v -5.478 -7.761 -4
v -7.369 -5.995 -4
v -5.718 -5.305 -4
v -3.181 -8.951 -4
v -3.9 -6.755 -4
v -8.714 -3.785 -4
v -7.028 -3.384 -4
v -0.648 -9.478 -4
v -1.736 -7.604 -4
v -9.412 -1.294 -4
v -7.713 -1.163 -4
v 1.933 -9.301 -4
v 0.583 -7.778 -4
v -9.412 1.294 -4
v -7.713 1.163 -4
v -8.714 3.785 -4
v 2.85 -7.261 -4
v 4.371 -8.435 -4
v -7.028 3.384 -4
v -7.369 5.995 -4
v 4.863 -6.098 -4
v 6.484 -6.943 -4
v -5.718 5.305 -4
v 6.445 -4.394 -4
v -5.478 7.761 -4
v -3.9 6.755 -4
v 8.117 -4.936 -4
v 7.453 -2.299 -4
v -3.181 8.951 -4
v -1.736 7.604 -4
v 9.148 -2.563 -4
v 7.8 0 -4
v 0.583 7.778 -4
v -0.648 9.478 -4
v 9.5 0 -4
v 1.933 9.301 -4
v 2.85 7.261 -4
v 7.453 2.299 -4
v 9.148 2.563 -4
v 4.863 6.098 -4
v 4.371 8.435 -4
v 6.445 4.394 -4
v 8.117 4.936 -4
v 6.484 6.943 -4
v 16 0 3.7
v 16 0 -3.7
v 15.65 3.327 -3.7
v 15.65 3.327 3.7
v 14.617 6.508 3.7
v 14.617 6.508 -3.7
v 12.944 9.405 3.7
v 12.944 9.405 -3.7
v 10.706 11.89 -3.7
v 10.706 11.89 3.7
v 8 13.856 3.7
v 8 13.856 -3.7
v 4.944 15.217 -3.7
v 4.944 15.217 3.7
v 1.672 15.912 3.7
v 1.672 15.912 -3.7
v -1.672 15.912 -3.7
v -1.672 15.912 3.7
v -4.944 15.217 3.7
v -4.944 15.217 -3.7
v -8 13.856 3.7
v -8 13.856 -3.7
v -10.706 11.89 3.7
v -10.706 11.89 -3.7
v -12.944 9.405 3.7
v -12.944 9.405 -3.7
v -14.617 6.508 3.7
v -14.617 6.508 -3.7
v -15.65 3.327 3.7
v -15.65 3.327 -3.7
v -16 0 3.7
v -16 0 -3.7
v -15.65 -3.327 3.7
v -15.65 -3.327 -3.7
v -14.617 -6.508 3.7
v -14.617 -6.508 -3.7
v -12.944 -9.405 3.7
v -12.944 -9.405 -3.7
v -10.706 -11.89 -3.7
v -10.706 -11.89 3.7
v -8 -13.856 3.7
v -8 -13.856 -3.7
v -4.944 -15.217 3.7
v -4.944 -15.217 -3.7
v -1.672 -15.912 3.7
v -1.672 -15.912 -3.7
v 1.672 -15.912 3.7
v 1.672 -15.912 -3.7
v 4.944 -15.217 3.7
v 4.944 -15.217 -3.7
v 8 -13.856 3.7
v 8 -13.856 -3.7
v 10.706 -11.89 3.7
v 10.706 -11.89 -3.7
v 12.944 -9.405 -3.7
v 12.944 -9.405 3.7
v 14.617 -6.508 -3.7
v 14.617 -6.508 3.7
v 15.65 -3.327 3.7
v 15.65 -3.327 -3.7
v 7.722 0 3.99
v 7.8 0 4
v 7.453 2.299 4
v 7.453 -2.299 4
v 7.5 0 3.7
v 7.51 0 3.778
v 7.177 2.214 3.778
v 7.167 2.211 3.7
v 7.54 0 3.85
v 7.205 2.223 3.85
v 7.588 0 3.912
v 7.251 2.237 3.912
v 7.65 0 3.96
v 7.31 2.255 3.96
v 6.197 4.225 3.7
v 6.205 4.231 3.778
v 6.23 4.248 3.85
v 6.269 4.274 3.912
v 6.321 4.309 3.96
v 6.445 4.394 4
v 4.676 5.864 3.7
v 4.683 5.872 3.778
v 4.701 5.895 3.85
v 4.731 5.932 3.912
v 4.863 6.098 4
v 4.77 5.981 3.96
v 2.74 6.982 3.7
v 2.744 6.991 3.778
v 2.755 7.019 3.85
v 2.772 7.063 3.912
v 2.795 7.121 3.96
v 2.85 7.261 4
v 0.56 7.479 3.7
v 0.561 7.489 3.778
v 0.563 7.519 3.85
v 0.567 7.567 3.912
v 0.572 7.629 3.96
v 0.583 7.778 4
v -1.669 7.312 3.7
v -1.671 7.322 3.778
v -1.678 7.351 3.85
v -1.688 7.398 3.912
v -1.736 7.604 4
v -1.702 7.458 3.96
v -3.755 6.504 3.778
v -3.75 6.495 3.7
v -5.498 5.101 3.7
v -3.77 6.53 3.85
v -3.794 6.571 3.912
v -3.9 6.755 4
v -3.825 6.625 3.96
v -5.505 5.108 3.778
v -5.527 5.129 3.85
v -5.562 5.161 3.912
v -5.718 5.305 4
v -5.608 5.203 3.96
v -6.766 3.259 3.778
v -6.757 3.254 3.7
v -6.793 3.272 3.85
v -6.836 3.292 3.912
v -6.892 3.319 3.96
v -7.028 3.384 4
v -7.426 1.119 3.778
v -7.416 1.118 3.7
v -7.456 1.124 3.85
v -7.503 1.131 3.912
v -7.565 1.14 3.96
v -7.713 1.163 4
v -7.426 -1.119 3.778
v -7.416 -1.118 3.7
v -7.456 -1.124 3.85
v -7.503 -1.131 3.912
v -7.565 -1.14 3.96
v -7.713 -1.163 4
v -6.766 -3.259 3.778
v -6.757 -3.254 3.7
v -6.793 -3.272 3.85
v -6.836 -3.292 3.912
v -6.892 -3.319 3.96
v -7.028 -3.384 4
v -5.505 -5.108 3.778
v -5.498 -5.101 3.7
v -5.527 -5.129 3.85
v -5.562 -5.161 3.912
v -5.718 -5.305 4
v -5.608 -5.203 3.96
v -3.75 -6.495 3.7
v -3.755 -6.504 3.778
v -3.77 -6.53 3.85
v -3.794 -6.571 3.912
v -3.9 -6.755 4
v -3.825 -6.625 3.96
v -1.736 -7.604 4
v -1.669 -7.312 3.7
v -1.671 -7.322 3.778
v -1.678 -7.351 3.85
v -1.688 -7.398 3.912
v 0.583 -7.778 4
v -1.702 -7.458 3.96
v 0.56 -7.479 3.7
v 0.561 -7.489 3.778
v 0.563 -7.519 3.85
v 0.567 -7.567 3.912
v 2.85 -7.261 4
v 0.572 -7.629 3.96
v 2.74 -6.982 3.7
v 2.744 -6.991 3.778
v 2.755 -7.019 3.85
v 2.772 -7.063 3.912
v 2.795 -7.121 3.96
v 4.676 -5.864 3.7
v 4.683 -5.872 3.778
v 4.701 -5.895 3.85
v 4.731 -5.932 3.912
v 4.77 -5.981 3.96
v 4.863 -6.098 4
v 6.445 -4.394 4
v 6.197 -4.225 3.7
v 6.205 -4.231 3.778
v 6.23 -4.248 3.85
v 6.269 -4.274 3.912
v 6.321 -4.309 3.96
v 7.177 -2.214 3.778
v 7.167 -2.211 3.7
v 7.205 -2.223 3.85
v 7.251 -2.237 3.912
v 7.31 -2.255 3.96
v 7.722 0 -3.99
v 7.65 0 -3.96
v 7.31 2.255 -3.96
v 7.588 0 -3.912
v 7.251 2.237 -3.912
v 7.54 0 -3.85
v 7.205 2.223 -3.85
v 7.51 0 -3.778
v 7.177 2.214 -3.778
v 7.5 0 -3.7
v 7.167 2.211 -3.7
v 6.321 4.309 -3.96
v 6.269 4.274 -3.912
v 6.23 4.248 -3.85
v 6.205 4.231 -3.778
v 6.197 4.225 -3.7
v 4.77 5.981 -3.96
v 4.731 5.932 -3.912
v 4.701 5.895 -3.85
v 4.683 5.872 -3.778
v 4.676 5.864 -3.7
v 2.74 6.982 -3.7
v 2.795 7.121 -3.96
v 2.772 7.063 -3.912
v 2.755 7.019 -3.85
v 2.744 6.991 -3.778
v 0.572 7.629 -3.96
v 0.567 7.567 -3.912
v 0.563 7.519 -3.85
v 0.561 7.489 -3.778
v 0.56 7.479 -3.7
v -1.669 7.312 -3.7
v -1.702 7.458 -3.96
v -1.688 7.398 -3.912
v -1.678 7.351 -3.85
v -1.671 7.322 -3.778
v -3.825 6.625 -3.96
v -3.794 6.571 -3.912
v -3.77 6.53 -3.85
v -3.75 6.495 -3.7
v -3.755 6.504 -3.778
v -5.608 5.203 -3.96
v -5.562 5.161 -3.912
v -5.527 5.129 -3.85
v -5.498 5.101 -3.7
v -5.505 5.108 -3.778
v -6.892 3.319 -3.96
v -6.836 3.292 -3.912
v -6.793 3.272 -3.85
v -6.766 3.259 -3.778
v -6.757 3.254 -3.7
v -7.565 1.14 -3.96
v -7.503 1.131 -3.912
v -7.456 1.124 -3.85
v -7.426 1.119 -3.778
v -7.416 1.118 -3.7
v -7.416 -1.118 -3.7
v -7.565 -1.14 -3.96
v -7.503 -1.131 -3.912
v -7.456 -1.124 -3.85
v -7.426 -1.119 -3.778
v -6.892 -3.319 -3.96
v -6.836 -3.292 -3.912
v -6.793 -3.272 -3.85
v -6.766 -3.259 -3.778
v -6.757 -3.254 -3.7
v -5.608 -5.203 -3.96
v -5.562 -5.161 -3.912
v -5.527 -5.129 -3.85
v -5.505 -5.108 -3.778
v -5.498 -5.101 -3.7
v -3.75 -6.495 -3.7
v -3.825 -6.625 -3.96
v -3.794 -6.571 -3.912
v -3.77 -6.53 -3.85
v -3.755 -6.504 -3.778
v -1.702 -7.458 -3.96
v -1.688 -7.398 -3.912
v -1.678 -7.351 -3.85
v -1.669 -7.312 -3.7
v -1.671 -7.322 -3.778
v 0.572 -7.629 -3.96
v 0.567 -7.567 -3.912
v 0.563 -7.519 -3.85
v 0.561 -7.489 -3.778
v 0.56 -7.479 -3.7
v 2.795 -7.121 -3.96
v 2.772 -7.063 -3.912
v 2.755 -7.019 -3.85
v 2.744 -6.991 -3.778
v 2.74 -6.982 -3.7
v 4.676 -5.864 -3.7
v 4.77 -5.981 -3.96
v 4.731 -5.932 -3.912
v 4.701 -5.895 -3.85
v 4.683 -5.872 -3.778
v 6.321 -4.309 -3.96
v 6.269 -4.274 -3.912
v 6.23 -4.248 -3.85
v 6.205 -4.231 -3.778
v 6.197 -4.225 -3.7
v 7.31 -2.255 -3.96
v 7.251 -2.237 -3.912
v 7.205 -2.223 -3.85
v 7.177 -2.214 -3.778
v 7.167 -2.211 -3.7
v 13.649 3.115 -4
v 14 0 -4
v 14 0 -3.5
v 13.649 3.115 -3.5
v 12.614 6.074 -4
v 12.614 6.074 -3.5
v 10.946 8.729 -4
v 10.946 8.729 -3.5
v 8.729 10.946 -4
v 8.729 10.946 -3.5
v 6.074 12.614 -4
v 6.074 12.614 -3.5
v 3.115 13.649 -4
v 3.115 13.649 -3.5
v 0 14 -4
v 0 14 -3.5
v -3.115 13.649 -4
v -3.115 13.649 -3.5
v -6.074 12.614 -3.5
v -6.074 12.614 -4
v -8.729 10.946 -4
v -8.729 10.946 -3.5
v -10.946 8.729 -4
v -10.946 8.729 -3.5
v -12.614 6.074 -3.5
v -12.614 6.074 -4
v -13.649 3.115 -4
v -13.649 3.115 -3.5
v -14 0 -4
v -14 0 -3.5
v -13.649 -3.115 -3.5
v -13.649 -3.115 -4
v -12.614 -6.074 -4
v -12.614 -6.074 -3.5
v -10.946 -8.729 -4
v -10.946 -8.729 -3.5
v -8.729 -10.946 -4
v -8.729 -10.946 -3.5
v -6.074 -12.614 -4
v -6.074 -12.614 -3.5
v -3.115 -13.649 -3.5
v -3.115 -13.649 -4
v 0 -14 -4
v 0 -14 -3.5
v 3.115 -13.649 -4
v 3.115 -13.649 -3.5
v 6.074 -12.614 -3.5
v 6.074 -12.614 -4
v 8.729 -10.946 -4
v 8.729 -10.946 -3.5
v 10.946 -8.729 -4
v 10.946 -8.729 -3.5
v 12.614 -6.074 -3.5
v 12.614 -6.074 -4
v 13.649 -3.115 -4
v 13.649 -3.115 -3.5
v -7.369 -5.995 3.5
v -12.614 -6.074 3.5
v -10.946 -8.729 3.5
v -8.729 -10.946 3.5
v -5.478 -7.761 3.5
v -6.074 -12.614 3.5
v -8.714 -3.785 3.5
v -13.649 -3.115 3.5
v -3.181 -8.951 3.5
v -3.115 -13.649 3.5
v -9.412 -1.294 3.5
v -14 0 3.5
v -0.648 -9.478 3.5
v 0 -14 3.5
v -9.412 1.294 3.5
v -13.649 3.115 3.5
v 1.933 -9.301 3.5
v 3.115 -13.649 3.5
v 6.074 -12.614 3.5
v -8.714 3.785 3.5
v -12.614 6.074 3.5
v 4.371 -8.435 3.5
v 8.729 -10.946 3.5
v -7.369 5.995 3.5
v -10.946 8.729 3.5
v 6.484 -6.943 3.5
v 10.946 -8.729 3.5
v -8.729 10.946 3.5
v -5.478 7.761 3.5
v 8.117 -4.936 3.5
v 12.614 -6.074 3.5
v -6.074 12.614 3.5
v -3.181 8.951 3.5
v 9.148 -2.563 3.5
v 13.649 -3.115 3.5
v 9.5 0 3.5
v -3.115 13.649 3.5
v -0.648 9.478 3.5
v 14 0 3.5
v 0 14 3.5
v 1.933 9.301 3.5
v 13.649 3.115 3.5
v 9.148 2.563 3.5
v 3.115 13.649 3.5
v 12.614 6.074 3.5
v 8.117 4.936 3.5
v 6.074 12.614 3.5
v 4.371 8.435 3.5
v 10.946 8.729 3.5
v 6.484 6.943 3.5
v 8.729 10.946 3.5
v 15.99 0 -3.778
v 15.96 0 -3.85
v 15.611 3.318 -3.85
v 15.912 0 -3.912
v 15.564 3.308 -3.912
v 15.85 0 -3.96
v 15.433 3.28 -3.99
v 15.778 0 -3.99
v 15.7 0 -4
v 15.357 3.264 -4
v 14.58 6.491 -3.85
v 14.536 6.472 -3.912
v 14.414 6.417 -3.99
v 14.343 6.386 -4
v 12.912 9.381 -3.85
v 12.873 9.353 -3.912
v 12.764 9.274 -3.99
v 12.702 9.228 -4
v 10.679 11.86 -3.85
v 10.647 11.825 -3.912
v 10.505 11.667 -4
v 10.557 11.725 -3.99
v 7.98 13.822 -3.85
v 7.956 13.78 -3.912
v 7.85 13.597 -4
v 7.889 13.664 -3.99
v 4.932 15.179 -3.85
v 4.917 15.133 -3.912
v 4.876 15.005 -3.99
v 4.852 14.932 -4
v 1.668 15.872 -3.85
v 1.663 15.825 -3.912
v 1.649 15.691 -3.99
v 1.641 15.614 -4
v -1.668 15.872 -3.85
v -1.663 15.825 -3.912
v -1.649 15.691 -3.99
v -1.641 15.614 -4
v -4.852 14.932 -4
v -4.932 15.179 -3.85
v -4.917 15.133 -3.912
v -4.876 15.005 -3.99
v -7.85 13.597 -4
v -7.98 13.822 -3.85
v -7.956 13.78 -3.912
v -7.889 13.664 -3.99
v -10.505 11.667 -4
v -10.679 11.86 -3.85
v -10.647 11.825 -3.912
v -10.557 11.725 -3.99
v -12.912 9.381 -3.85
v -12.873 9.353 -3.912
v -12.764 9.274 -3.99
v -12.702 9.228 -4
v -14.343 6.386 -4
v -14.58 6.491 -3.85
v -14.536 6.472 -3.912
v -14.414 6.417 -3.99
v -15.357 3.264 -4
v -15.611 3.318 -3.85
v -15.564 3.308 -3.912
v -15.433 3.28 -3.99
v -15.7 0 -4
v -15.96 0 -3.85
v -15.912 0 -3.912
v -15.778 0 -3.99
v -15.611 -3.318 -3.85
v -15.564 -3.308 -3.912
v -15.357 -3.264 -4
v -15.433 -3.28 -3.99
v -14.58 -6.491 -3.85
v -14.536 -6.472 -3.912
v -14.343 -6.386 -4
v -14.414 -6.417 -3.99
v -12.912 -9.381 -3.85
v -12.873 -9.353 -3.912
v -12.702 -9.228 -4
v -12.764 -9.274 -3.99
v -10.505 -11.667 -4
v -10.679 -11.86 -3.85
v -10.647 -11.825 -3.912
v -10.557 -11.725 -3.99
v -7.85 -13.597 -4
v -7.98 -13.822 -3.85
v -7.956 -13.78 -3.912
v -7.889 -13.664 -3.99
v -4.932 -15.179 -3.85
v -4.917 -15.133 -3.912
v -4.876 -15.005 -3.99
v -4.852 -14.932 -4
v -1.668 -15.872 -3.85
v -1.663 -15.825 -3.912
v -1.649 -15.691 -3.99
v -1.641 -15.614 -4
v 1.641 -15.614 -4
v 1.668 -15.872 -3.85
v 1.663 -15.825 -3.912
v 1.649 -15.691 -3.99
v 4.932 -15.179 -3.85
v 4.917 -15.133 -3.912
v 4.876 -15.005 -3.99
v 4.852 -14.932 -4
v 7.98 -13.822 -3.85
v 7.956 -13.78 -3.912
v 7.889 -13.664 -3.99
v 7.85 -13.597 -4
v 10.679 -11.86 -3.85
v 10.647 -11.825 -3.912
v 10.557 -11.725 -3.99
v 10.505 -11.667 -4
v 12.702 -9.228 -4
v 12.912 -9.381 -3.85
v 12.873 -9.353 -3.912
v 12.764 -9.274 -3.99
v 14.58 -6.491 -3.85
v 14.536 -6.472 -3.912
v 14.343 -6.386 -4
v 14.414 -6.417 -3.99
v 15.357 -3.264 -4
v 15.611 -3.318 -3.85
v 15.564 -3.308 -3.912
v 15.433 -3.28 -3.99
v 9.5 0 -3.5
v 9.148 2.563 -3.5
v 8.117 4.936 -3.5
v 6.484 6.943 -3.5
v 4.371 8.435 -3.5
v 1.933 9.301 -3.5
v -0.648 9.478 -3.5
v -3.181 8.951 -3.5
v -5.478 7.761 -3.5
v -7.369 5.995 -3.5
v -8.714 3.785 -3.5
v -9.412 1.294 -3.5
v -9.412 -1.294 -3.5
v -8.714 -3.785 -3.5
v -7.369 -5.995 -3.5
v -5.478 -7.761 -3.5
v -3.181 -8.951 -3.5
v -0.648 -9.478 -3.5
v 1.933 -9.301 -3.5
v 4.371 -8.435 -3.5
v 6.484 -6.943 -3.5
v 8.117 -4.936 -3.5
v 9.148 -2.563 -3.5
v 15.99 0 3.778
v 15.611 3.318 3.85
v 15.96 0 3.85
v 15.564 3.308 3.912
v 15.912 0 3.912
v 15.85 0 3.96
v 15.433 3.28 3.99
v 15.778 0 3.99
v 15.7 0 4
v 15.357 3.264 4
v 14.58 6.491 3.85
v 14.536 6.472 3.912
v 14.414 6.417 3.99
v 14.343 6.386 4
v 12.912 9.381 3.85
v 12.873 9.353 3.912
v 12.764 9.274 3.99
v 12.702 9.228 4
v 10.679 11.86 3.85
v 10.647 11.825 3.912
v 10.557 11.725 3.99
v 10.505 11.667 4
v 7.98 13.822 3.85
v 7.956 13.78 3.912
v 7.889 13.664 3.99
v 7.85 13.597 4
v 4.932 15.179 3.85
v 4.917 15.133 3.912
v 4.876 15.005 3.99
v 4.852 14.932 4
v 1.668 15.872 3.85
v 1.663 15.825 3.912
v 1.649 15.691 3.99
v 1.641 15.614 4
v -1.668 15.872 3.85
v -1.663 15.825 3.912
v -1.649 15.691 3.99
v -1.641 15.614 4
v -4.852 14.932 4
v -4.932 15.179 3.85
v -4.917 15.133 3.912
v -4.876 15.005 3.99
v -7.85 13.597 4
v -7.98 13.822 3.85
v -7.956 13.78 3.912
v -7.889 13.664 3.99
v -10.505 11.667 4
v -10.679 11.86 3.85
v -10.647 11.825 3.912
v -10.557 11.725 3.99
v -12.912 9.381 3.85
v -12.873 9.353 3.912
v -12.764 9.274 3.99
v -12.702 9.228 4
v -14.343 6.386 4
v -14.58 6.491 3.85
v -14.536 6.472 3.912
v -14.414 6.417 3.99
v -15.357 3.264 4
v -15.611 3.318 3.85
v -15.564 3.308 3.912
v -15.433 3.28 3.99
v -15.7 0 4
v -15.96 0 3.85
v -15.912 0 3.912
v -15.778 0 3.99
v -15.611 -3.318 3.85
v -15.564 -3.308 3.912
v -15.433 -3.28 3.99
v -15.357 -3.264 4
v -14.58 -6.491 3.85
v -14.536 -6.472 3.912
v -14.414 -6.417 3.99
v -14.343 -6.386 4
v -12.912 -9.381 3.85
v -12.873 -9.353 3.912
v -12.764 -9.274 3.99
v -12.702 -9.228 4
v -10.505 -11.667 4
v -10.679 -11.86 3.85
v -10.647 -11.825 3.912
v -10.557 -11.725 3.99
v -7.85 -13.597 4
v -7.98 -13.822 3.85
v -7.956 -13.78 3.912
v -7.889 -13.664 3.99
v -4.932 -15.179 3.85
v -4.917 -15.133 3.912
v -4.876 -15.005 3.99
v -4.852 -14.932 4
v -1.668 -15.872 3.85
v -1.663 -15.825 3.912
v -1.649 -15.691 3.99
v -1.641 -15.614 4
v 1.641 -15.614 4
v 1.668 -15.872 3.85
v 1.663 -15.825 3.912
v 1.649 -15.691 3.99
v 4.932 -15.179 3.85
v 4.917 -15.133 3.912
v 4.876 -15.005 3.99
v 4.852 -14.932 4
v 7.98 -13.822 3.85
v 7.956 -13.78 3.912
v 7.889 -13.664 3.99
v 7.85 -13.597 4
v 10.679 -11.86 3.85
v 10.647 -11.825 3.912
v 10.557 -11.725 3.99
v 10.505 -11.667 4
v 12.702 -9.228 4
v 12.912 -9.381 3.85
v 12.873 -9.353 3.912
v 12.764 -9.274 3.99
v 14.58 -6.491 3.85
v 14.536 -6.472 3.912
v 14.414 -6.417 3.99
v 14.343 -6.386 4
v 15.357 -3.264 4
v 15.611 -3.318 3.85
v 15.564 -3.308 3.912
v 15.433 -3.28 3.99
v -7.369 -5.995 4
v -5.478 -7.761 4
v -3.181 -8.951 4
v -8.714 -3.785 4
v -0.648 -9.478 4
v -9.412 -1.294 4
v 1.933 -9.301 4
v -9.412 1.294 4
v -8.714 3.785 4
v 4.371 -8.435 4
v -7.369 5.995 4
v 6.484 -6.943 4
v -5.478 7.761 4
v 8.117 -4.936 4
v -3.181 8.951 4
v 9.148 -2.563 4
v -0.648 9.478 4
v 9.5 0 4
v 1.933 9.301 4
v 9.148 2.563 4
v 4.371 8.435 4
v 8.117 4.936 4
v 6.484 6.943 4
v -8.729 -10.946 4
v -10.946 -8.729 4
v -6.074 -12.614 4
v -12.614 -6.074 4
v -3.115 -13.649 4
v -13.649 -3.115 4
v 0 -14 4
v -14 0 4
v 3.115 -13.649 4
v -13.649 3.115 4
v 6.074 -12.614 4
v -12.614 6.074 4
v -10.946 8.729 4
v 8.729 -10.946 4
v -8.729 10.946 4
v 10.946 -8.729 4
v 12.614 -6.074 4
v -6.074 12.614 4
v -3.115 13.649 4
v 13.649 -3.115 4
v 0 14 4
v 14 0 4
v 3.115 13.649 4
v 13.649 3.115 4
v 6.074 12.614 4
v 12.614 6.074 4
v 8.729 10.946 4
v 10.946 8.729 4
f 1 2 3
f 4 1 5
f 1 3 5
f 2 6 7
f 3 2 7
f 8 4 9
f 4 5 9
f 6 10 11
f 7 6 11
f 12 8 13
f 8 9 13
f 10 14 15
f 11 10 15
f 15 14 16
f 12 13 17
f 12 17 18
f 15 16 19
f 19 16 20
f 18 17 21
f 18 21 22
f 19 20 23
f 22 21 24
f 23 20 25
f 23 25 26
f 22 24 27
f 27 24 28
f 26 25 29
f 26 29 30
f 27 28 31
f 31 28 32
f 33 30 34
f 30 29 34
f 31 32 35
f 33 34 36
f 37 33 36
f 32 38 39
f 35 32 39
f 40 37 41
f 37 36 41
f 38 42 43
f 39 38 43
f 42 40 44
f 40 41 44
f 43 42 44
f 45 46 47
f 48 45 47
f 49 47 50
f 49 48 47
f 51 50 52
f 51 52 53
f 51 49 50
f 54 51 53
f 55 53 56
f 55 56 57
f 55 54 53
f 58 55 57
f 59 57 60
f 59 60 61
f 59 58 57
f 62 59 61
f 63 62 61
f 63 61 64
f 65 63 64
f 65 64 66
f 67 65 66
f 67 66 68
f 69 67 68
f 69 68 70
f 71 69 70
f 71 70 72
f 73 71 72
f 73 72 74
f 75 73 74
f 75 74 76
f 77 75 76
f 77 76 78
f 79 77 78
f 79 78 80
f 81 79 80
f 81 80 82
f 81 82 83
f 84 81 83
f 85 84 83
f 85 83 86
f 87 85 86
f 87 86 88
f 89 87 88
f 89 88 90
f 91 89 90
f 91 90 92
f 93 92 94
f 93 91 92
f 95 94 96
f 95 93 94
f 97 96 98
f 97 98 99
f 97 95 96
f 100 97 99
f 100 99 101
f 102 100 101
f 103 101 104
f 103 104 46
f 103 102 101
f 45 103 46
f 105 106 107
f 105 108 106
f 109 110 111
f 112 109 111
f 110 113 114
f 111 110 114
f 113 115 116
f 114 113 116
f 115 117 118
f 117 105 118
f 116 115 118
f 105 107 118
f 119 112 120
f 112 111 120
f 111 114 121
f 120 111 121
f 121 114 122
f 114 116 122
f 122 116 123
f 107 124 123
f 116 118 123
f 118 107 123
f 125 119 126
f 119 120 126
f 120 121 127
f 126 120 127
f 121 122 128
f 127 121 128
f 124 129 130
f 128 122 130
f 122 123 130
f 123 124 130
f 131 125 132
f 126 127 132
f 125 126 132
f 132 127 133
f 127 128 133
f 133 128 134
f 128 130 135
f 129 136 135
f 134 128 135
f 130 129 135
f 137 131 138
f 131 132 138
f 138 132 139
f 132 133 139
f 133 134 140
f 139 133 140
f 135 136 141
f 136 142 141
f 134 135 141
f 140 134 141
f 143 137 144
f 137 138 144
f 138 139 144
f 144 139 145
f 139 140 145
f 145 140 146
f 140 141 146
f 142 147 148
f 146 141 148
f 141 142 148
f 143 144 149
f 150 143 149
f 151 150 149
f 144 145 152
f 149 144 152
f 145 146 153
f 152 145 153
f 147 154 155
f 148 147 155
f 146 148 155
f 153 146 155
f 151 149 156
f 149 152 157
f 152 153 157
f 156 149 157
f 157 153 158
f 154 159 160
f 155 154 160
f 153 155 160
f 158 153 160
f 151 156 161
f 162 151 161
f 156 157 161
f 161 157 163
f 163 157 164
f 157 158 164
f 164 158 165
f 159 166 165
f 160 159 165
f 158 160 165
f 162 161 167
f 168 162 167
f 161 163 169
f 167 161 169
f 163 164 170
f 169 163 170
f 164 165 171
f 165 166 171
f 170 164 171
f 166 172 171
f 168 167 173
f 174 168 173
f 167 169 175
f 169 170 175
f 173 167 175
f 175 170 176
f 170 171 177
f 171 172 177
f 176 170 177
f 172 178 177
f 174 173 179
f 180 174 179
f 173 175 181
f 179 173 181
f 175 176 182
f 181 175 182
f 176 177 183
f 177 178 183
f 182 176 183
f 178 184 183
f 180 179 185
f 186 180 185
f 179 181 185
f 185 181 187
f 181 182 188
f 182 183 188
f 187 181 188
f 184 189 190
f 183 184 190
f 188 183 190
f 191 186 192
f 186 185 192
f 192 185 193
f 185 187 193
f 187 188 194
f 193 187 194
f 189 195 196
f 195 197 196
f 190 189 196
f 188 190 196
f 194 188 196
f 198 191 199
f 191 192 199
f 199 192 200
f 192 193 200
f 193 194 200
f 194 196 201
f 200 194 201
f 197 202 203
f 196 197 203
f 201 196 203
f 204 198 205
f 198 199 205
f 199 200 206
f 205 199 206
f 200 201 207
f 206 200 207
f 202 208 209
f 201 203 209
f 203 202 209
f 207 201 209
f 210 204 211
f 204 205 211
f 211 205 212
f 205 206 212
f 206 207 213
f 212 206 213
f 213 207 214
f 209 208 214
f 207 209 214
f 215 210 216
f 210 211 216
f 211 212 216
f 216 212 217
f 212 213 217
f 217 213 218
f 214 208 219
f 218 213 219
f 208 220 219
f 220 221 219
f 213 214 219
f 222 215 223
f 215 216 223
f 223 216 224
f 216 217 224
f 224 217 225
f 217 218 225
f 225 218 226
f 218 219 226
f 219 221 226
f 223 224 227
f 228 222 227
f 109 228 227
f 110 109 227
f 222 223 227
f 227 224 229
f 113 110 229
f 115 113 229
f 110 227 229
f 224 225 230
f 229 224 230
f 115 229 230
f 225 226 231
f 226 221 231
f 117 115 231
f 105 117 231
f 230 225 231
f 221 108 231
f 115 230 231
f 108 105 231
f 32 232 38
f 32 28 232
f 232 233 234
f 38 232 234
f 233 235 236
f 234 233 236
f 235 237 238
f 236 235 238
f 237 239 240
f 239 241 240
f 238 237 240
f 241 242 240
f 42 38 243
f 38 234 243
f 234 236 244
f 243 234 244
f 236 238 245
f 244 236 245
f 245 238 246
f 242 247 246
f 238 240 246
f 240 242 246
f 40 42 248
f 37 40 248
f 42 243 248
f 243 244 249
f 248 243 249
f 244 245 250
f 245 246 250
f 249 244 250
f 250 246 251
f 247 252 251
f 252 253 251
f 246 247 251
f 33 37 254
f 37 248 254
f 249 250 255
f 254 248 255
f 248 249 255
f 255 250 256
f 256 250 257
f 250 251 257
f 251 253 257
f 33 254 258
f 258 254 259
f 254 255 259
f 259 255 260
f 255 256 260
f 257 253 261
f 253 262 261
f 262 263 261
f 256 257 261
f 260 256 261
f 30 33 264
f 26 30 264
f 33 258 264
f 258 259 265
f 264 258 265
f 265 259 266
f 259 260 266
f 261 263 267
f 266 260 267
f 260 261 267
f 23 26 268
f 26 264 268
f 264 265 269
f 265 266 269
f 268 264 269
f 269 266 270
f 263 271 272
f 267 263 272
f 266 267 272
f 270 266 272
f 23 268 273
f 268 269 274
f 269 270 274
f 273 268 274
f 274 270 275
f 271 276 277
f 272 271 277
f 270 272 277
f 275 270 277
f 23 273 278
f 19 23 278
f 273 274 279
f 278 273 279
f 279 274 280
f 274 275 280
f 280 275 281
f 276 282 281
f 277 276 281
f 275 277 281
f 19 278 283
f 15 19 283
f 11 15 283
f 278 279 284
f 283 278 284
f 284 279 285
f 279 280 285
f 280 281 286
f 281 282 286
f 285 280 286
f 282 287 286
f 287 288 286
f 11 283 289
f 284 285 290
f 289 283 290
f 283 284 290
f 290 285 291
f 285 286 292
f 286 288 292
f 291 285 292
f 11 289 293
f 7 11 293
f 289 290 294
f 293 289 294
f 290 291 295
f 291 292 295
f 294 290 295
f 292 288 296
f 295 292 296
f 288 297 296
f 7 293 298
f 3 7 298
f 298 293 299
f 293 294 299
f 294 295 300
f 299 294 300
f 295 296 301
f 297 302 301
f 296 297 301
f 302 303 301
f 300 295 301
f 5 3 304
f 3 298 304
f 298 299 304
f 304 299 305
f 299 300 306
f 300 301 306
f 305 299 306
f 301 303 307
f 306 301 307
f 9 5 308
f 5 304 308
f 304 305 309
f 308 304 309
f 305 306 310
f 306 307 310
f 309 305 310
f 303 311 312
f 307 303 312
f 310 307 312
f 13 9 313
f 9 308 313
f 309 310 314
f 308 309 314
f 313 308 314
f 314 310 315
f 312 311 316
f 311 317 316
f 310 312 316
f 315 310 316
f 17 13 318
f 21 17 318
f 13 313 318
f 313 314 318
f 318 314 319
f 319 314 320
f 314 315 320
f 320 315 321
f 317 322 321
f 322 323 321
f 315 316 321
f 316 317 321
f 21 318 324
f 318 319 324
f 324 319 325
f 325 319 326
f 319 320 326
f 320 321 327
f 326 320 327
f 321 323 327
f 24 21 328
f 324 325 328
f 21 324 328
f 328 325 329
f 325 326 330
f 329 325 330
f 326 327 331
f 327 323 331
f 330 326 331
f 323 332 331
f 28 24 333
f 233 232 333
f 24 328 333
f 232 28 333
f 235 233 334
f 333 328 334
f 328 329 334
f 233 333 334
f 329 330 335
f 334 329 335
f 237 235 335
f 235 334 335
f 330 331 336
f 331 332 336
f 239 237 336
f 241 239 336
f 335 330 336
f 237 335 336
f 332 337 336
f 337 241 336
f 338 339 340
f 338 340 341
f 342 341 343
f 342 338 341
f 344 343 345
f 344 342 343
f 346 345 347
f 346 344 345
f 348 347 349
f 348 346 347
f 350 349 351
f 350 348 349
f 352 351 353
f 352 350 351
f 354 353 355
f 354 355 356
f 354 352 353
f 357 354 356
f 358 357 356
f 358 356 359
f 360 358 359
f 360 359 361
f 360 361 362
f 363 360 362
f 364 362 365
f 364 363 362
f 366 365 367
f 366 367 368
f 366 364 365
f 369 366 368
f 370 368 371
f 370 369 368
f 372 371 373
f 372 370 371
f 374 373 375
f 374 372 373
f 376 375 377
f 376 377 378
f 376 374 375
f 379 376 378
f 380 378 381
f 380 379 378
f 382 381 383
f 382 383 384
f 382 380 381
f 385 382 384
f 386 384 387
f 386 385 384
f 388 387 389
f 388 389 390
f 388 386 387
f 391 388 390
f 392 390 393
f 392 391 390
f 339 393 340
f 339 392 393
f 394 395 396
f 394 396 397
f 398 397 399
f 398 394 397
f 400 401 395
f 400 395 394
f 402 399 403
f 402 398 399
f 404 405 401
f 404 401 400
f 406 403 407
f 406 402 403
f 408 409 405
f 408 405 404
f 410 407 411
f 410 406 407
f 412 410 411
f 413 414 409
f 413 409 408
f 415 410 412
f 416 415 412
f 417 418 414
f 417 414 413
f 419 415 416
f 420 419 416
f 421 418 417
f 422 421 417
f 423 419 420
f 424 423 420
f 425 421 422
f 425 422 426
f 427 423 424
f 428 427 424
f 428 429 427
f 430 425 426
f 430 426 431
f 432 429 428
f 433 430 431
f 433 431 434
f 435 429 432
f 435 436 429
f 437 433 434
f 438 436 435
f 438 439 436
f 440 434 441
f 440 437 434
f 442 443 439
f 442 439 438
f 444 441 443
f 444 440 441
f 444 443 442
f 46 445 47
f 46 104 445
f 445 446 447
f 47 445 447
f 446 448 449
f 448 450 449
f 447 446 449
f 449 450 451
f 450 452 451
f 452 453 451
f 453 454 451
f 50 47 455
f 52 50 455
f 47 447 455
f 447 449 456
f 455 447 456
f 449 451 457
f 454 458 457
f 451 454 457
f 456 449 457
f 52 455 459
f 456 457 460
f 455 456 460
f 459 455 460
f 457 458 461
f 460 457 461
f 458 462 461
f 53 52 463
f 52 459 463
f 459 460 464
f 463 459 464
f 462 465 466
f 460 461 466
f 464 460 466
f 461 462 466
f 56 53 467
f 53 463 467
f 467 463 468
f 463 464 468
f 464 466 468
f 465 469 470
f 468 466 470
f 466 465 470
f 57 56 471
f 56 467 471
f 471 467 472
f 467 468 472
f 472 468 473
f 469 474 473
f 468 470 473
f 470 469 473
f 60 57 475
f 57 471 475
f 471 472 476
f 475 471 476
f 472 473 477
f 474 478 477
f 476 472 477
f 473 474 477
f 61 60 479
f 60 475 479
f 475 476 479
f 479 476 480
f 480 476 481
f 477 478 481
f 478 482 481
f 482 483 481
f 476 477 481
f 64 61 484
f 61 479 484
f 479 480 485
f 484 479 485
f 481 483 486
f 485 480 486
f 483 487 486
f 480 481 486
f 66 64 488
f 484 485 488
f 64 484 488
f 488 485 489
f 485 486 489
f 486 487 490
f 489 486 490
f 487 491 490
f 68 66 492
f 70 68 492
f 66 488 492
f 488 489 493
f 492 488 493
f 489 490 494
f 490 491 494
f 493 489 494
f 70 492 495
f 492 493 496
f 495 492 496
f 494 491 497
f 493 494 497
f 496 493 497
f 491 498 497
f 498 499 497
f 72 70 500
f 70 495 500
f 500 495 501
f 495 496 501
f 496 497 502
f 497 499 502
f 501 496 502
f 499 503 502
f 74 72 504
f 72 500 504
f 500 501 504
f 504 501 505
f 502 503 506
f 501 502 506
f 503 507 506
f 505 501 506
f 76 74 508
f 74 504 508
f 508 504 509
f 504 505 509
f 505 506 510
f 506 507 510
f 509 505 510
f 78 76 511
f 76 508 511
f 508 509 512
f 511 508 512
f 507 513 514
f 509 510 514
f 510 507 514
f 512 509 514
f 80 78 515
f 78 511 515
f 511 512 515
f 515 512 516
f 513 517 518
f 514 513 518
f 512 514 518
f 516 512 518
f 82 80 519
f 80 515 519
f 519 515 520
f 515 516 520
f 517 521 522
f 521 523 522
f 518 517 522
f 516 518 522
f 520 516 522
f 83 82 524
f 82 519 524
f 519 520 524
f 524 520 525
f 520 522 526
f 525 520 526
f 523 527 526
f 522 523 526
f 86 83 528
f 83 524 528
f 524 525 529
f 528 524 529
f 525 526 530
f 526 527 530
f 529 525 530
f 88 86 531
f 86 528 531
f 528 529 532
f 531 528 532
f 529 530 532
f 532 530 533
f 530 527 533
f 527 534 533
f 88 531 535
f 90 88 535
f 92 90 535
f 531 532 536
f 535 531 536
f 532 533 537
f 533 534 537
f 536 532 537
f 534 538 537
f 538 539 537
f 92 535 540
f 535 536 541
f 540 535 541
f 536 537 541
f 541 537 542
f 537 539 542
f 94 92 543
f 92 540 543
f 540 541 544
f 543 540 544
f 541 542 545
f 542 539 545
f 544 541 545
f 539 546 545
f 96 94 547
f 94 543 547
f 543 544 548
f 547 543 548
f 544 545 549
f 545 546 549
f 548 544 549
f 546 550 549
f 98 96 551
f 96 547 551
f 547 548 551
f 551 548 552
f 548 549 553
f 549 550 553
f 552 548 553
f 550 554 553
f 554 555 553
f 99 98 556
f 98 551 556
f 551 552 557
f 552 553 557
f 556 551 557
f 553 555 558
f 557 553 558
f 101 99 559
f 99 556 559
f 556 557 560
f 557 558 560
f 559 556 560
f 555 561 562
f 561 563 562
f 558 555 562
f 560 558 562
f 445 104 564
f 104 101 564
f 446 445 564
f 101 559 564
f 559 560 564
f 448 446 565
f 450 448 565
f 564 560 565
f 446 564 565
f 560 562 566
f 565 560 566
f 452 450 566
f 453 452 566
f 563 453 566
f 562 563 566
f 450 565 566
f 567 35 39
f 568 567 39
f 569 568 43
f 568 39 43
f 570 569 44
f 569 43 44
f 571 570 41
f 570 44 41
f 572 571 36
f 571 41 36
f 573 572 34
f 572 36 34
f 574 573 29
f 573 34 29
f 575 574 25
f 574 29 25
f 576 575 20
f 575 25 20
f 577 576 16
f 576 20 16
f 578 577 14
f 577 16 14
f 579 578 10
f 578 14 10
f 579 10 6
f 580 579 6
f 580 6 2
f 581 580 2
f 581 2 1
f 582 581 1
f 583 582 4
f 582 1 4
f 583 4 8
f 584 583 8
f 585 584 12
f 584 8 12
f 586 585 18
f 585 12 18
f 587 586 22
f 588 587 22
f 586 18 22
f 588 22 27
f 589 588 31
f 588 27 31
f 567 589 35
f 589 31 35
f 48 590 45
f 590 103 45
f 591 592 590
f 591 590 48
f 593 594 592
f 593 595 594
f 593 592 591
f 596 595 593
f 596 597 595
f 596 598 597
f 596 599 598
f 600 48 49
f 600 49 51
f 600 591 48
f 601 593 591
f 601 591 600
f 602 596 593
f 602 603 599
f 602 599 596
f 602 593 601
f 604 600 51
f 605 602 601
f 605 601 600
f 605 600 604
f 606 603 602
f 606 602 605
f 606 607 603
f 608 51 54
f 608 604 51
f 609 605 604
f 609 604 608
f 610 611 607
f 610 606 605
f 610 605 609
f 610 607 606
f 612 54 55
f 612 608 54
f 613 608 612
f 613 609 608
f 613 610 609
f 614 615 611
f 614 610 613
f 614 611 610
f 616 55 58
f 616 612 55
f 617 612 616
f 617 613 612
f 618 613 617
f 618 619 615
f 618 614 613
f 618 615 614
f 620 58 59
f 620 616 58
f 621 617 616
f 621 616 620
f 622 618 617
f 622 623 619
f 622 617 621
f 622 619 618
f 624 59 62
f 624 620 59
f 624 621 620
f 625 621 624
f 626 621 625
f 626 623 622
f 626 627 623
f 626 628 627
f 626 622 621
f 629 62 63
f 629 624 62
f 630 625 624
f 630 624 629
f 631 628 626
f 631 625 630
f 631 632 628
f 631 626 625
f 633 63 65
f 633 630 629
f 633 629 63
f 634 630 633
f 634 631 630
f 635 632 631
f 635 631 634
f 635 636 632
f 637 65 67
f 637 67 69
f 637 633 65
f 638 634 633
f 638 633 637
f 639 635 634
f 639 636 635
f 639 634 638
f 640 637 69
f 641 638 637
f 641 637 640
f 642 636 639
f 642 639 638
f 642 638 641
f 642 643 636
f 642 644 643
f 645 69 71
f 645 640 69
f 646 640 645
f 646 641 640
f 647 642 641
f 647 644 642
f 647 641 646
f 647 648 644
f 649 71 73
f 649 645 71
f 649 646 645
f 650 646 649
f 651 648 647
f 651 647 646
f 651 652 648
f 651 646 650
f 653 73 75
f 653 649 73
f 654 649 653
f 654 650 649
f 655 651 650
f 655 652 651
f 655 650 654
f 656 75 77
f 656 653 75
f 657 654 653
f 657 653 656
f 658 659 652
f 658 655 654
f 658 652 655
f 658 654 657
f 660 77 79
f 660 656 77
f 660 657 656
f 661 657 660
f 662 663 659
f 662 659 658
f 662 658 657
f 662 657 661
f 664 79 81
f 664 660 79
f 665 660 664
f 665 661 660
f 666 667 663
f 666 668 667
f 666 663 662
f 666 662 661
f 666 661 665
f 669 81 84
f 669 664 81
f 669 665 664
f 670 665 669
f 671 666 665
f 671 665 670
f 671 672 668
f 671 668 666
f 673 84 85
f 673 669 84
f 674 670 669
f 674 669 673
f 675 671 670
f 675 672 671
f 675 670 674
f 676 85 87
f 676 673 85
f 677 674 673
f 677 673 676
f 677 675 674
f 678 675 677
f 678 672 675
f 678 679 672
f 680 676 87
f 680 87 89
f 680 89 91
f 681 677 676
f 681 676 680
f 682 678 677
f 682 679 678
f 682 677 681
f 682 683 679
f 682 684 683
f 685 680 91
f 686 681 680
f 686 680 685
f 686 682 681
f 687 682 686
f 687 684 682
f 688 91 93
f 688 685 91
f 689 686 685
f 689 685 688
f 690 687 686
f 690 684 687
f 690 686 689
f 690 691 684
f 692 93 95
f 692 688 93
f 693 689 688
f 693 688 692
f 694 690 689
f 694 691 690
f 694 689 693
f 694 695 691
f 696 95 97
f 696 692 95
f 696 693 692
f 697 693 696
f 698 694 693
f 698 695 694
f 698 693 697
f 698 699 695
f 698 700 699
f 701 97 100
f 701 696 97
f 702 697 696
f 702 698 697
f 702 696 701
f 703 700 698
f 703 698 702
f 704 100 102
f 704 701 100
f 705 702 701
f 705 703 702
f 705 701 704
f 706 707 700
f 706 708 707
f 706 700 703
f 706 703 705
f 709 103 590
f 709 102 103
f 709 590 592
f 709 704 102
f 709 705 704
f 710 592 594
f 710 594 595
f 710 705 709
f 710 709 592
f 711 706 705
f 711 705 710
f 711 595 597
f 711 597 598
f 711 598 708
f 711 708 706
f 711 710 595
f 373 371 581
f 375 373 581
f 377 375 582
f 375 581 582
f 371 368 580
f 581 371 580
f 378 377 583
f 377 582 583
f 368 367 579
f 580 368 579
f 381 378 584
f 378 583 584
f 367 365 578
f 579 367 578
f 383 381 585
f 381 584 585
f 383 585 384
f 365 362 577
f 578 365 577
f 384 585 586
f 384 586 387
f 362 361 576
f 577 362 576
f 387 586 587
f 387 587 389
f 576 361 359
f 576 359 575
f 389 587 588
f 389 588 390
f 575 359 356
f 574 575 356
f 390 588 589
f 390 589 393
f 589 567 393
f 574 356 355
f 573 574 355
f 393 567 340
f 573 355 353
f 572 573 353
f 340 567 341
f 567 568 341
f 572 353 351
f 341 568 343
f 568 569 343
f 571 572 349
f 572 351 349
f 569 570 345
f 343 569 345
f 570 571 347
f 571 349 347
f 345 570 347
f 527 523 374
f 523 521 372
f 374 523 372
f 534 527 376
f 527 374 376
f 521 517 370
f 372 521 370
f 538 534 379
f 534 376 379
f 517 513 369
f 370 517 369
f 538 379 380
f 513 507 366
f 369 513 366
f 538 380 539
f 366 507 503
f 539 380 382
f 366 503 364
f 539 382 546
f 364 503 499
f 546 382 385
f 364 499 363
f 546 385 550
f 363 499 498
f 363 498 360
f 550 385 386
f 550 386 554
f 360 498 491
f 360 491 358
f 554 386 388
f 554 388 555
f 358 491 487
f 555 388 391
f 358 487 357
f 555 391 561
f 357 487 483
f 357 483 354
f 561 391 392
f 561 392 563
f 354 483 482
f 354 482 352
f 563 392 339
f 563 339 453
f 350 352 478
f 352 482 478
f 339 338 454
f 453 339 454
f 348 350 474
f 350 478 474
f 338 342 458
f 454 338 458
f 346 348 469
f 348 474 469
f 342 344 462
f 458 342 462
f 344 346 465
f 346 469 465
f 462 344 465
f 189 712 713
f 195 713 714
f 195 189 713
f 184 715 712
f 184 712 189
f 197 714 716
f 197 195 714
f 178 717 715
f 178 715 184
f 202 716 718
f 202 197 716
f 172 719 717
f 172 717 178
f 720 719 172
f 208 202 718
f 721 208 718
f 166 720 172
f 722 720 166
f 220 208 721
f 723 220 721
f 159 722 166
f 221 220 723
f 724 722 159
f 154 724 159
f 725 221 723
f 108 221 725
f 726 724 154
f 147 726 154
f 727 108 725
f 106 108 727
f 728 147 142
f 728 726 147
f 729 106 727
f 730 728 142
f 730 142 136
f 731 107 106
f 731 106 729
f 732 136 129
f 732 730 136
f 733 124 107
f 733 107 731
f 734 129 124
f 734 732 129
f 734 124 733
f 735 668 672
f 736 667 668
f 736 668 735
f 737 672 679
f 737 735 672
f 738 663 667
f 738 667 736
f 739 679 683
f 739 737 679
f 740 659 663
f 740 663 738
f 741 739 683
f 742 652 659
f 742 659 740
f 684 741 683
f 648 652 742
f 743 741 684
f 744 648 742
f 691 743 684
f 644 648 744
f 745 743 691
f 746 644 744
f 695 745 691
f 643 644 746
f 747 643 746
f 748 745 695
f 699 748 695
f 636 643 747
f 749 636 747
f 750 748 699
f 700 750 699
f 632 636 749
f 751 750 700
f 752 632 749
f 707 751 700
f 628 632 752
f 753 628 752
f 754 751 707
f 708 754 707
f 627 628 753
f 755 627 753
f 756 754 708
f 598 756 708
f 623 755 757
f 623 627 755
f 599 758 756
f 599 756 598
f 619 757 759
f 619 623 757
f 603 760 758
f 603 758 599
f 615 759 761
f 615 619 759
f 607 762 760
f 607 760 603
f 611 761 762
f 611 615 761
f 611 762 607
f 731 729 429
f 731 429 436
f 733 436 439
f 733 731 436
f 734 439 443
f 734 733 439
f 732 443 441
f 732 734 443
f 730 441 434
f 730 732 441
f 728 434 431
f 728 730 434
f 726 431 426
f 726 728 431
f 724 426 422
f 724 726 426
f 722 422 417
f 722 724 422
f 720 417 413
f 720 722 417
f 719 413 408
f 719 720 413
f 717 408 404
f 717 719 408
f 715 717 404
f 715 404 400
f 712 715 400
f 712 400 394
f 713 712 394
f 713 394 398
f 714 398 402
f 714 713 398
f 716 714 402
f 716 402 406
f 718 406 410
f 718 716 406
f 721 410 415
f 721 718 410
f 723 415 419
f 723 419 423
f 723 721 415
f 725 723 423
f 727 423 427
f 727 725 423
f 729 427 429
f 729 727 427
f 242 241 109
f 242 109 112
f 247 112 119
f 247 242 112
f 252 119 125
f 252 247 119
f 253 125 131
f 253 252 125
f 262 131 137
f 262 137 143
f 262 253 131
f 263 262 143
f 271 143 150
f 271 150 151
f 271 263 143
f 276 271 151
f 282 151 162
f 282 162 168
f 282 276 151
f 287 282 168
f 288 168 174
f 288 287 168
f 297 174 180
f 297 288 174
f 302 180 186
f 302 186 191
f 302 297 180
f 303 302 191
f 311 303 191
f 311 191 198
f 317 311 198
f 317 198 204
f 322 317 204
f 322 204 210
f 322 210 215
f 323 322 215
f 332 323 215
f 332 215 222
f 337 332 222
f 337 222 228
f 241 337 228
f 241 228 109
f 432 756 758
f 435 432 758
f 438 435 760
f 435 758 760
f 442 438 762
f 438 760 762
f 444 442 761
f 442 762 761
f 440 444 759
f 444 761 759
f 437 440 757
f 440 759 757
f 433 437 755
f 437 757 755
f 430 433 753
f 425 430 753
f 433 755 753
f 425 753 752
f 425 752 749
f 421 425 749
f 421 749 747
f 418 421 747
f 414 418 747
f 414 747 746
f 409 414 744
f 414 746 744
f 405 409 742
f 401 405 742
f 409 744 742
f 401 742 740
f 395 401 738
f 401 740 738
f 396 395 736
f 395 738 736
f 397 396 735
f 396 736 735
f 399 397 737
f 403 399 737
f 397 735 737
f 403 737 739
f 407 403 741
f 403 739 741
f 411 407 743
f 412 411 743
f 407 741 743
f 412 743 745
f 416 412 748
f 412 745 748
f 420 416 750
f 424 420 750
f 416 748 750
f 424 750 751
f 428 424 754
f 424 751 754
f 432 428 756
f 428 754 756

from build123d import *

# Parameters (mm, degrees)
SKETCH1_R           = 16
SKETCH1_R_2         = 7.5
BOSS_EXTRUDE1_DEPTH = 4
SKETCH2_R           = 14
SKETCH2_R_2         = 9.5
CUT_EXTRUDE1_DEPTH  = 0.5
FILLET1_R           = 0.3


with BuildPart() as part:
    # Sketch1 → Boss-Extrude1 (new, symmetric)
    with BuildSketch(Plane.XY):
        Circle(SKETCH1_R)
        Circle(SKETCH1_R_2, mode=Mode.SUBTRACT)
    extrude(amount=BOSS_EXTRUDE1_DEPTH, both=True)

    # Sketch2 → Cut-Extrude1 (cut)
    with BuildSketch(Plane.XY.offset(4)):
        Circle(SKETCH2_R)
        Circle(SKETCH2_R_2, mode=Mode.SUBTRACT)
    cut_extrude1 = extrude(amount=-CUT_EXTRUDE1_DEPTH, mode=Mode.SUBTRACT)

    # Fillet1
    fillet1_edges = [part.edges().sort_by_distance(p)[0] for p in [
        (-16, 0, -4),
        (-16, 0, 4),
        (-7.5, 0, -4),
        (-7.5, 0, 4),
    ]]
    fillet(fillet1_edges, radius=FILLET1_R)

    # Mirror4: Cut-Extrude1 across plane
    add(cut_extrude1.mirror(Plane.XY), mode=Mode.SUBTRACT)


solid = part.part
